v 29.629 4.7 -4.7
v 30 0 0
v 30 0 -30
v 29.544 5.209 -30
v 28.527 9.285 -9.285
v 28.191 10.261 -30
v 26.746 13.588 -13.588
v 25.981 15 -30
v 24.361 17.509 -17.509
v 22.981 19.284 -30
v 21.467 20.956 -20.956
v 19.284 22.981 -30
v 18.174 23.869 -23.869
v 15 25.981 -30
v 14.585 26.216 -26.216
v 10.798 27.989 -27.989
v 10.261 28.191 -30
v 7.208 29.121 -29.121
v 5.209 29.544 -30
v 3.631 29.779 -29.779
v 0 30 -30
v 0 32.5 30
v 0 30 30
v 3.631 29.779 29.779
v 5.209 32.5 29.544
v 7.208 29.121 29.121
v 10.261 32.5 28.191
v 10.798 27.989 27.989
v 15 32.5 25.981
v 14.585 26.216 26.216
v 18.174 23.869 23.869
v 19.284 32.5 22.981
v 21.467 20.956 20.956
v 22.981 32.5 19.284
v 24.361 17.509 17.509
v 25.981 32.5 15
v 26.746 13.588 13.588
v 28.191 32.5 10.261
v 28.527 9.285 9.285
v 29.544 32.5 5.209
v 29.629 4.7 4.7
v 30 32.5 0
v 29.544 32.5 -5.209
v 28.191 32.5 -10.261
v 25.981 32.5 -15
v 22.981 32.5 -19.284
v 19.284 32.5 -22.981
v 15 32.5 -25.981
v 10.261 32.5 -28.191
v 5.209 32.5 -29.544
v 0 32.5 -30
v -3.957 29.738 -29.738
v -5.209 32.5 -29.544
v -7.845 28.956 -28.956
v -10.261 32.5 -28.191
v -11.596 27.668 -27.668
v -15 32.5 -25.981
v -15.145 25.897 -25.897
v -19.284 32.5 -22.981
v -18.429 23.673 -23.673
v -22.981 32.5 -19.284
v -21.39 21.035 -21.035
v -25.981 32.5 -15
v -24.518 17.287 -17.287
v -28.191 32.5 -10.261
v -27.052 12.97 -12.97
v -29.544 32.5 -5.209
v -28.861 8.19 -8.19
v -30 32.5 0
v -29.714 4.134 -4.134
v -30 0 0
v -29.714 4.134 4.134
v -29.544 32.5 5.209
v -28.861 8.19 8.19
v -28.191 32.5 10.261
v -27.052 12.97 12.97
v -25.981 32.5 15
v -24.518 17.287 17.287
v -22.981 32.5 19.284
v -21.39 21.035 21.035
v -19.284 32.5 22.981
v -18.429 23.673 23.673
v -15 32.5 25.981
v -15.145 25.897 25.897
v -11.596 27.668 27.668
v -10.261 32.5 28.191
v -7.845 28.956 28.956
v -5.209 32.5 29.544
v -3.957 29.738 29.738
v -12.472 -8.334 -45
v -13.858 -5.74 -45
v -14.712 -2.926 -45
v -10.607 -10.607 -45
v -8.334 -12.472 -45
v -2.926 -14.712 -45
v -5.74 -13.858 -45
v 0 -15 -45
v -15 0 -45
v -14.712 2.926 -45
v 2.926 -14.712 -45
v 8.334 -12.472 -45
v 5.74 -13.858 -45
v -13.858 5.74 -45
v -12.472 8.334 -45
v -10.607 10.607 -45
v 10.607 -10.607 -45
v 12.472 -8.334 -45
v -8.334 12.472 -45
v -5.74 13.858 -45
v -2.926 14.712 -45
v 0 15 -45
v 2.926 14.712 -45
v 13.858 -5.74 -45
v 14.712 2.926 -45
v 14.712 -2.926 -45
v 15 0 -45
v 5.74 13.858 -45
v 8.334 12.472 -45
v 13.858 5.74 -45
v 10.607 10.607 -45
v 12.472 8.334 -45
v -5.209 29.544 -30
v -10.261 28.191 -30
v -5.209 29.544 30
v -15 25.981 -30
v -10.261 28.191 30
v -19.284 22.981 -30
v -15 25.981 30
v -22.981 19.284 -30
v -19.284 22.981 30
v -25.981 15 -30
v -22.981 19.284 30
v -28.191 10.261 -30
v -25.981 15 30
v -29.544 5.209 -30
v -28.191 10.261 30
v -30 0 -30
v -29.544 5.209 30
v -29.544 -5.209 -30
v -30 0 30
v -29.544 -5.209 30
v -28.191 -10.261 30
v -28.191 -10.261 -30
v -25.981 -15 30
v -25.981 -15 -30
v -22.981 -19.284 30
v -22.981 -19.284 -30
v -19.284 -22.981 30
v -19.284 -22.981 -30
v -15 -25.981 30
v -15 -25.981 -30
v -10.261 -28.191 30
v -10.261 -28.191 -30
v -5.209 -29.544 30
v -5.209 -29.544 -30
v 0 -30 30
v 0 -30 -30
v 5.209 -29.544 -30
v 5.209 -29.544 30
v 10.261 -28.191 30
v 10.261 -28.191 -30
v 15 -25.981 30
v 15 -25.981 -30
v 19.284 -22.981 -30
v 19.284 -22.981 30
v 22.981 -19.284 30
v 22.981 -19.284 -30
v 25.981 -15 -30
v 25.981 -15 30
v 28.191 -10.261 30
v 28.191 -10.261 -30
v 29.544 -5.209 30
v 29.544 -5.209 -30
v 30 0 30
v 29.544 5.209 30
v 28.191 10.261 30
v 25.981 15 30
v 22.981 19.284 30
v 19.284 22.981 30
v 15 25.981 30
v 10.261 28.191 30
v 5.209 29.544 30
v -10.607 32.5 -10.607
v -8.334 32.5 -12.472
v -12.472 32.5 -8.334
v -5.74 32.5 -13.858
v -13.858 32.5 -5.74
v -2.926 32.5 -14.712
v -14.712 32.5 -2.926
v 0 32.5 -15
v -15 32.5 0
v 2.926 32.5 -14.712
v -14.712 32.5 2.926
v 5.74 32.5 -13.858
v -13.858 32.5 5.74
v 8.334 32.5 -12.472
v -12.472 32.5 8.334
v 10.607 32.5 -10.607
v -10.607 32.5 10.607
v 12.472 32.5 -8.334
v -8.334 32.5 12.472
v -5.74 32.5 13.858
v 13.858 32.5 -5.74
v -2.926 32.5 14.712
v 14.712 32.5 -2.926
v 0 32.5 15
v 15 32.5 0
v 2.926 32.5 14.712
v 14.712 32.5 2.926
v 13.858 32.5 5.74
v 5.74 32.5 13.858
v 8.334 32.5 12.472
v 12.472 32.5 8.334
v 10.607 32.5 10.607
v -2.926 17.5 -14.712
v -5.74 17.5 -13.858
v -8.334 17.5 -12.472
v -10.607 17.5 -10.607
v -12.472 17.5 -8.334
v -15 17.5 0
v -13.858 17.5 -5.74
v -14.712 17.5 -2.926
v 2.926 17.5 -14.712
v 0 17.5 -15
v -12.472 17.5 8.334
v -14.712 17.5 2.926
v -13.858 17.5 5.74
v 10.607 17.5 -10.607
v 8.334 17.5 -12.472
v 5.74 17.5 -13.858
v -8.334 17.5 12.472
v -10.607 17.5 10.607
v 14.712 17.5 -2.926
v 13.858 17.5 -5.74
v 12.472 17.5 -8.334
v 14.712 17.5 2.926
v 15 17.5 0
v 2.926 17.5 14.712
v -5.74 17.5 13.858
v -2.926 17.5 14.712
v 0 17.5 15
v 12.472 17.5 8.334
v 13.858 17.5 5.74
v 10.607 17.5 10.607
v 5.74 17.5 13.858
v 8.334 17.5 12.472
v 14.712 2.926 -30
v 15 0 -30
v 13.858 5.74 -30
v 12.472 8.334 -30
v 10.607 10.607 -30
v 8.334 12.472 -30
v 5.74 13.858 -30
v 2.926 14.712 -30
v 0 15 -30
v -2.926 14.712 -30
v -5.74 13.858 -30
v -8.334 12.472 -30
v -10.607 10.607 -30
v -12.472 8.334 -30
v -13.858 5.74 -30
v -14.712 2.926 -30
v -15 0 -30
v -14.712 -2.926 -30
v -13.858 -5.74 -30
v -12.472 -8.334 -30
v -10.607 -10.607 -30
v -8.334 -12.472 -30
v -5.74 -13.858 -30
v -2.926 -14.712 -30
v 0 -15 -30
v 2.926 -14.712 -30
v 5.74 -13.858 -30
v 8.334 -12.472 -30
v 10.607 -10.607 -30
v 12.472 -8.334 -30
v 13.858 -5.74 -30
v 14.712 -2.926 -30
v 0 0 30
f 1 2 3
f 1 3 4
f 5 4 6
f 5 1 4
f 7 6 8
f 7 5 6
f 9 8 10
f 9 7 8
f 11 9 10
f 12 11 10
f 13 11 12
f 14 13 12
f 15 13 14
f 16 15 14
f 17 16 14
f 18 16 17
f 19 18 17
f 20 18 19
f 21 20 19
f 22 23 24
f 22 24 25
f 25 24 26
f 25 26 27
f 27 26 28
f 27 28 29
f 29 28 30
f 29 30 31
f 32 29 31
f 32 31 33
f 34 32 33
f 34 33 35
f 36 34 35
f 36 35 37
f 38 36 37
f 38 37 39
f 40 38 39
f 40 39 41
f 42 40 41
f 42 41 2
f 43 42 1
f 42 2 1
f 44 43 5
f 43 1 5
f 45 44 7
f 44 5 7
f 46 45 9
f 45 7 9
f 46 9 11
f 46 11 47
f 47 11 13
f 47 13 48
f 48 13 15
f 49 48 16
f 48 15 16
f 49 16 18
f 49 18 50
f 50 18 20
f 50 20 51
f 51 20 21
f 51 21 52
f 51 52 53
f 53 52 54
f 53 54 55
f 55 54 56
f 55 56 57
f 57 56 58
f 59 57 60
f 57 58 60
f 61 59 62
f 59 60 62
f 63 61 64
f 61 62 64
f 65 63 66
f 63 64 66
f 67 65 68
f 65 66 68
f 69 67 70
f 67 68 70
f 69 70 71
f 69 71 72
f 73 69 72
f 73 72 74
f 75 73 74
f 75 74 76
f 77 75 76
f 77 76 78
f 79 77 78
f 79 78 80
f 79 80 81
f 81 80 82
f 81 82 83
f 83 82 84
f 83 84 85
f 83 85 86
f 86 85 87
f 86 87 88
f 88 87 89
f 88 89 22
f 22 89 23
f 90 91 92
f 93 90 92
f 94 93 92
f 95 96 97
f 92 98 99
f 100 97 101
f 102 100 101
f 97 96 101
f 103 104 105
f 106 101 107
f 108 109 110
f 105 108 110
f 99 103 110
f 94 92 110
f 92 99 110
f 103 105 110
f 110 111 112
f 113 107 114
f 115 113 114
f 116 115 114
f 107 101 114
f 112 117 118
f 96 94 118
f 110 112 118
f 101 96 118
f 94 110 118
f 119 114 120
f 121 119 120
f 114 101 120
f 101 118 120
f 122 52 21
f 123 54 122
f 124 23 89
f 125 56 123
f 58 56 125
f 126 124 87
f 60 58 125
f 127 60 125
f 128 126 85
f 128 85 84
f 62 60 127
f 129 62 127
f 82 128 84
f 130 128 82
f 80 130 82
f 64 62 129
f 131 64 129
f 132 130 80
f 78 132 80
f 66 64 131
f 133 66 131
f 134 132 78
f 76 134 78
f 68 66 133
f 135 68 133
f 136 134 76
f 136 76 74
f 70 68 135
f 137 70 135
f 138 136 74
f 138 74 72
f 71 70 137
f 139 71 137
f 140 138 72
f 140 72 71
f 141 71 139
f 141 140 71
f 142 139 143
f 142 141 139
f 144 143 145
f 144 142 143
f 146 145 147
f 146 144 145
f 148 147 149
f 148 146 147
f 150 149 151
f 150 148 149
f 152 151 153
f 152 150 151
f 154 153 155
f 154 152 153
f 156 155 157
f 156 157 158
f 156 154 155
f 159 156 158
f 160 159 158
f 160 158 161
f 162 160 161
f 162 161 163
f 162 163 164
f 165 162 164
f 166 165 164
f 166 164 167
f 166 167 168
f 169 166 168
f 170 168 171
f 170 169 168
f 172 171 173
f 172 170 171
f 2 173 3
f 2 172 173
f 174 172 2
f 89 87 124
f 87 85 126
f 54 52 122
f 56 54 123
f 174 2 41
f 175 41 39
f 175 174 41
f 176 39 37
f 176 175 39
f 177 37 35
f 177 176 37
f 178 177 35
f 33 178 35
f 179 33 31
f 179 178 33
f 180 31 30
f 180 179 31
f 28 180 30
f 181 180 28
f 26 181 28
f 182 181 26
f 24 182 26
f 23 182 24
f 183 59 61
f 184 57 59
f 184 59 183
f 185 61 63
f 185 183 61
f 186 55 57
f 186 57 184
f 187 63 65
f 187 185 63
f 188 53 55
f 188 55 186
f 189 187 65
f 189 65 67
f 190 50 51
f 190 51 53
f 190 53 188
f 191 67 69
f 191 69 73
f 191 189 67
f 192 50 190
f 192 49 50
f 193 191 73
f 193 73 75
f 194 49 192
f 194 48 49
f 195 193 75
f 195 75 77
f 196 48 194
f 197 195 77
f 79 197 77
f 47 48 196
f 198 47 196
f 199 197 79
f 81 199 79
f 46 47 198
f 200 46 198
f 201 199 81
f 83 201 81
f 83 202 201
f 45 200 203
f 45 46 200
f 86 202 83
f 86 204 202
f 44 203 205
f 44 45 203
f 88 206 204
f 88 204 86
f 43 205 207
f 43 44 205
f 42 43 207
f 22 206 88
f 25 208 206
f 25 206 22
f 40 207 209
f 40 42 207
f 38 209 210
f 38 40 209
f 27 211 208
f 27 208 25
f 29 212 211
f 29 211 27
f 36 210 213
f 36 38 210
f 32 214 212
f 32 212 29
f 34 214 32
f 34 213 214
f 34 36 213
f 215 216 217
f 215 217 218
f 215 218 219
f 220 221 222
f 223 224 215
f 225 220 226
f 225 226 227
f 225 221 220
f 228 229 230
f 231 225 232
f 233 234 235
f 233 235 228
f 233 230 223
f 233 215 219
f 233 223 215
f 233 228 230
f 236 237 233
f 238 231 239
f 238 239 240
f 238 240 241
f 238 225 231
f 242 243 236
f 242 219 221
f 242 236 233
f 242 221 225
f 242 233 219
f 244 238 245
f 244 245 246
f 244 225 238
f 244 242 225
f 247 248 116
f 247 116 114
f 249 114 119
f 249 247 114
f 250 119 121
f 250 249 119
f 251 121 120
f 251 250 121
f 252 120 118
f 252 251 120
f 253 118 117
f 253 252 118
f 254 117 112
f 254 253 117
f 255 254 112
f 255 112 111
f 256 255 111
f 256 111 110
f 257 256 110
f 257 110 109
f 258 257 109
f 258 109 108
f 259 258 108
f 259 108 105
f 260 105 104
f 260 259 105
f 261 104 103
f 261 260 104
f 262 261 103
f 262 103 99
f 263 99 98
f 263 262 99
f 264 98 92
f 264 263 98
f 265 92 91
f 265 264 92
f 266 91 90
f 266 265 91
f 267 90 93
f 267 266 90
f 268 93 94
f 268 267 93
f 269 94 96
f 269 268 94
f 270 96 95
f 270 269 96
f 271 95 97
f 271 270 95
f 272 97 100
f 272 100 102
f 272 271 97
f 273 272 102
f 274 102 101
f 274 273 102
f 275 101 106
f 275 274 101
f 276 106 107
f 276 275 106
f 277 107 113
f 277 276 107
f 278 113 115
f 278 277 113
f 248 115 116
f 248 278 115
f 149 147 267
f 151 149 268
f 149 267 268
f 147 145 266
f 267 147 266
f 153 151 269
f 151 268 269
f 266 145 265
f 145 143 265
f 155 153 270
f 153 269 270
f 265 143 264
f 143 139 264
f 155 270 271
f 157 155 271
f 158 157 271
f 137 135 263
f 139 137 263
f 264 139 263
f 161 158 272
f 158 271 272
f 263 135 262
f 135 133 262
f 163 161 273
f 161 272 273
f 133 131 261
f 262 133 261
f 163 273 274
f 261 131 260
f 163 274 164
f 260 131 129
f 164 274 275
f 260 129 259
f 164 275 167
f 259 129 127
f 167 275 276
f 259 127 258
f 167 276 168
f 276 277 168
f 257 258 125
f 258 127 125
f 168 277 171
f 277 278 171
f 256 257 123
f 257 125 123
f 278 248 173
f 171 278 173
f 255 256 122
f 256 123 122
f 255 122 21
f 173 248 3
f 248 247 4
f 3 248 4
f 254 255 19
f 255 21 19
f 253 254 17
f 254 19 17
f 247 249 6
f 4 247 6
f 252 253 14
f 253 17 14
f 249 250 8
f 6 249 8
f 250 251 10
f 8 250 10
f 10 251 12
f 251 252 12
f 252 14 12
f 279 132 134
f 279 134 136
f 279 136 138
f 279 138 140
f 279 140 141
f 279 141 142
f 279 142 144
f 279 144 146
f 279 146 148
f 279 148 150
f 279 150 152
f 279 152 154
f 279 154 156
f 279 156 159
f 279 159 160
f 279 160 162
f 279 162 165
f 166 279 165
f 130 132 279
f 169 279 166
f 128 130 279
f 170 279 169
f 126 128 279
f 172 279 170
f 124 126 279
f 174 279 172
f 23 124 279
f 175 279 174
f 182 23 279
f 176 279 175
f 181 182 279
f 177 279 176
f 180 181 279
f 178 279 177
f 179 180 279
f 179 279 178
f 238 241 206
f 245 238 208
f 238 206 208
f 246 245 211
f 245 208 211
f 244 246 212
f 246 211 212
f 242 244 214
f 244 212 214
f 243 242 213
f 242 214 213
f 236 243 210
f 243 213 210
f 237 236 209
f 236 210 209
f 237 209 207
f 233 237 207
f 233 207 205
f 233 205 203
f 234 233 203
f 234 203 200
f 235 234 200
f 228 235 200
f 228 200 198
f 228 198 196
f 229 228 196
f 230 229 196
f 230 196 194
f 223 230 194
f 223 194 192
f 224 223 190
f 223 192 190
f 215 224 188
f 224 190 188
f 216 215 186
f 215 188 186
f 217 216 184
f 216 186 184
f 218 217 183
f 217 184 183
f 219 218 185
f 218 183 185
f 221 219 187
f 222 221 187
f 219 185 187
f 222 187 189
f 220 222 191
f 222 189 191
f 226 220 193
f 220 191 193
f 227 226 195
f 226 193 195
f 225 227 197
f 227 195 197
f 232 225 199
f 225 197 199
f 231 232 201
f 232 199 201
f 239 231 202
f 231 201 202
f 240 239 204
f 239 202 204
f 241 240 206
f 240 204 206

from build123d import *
from build123d.topology import SkipClean

# Parameters (mm, degrees)
SKETCH1_R           = 30
SKETCH1_R_2         = 15
BOSS_EXTRUDE1_DEPTH = 30
SKETCH2_R           = 30
SKETCH2_R_2         = 15
BOSS_EXTRUDE2_DEPTH = 32.5
CUT_EXTRUDE2_START  = 32.5
SKETCH2_3_R         = 15
CUT_EXTRUDE2_DEPTH  = 15
BOSS_EXTRUDE3_START = -30
SKETCH1_4_R         = 15
BOSS_EXTRUDE3_DEPTH = 15


with BuildPart() as part:
    # Sketch1 → Boss-Extrude1 (new, symmetric)
    with BuildSketch(Plane.XY):
        Circle(SKETCH1_R)
        Circle(SKETCH1_R_2, mode=Mode.SUBTRACT)
        Circle(SKETCH1_R_2)
    extrude(amount=BOSS_EXTRUDE1_DEPTH, both=True)

    # Sketch2 → Boss-Extrude2 (add)
    with SkipClean():  # the faces are left unmerged after this step: merging them gives an invalid solid
        with BuildSketch(Plane(origin=(0, 0, 0), x_dir=(1, 0, 0), z_dir=(0, 1, 0))):
            with Locations(Location((0, 0, 0), (0, 0, 270))):
                Circle(SKETCH2_R)
            Circle(SKETCH2_R_2, mode=Mode.SUBTRACT)
            Circle(SKETCH2_R_2)
        extrude(amount=BOSS_EXTRUDE2_DEPTH)

    # Sketch2<3> → Cut-Extrude2 (cut)
    with SkipClean():  # the faces are left unmerged after this step: merging them gives an invalid solid
        with BuildSketch(Plane(origin=(0, 0, 0), x_dir=(1, 0, 0), z_dir=(0, 1, 0)).offset(CUT_EXTRUDE2_START)):
            with Locations(Location((0, 0, 0), (0, 0, 270))):
                Circle(SKETCH2_3_R)
        extrude(amount=-CUT_EXTRUDE2_DEPTH, mode=Mode.SUBTRACT)

    # Sketch1<4> → Boss-Extrude3 (add)
    with SkipClean():  # the faces are left unmerged after this step: merging them gives an invalid solid
        with BuildSketch(Plane.XY.offset(BOSS_EXTRUDE3_START)):
            Circle(SKETCH1_4_R)
        extrude(amount=-BOSS_EXTRUDE3_DEPTH)


solid = part.part
